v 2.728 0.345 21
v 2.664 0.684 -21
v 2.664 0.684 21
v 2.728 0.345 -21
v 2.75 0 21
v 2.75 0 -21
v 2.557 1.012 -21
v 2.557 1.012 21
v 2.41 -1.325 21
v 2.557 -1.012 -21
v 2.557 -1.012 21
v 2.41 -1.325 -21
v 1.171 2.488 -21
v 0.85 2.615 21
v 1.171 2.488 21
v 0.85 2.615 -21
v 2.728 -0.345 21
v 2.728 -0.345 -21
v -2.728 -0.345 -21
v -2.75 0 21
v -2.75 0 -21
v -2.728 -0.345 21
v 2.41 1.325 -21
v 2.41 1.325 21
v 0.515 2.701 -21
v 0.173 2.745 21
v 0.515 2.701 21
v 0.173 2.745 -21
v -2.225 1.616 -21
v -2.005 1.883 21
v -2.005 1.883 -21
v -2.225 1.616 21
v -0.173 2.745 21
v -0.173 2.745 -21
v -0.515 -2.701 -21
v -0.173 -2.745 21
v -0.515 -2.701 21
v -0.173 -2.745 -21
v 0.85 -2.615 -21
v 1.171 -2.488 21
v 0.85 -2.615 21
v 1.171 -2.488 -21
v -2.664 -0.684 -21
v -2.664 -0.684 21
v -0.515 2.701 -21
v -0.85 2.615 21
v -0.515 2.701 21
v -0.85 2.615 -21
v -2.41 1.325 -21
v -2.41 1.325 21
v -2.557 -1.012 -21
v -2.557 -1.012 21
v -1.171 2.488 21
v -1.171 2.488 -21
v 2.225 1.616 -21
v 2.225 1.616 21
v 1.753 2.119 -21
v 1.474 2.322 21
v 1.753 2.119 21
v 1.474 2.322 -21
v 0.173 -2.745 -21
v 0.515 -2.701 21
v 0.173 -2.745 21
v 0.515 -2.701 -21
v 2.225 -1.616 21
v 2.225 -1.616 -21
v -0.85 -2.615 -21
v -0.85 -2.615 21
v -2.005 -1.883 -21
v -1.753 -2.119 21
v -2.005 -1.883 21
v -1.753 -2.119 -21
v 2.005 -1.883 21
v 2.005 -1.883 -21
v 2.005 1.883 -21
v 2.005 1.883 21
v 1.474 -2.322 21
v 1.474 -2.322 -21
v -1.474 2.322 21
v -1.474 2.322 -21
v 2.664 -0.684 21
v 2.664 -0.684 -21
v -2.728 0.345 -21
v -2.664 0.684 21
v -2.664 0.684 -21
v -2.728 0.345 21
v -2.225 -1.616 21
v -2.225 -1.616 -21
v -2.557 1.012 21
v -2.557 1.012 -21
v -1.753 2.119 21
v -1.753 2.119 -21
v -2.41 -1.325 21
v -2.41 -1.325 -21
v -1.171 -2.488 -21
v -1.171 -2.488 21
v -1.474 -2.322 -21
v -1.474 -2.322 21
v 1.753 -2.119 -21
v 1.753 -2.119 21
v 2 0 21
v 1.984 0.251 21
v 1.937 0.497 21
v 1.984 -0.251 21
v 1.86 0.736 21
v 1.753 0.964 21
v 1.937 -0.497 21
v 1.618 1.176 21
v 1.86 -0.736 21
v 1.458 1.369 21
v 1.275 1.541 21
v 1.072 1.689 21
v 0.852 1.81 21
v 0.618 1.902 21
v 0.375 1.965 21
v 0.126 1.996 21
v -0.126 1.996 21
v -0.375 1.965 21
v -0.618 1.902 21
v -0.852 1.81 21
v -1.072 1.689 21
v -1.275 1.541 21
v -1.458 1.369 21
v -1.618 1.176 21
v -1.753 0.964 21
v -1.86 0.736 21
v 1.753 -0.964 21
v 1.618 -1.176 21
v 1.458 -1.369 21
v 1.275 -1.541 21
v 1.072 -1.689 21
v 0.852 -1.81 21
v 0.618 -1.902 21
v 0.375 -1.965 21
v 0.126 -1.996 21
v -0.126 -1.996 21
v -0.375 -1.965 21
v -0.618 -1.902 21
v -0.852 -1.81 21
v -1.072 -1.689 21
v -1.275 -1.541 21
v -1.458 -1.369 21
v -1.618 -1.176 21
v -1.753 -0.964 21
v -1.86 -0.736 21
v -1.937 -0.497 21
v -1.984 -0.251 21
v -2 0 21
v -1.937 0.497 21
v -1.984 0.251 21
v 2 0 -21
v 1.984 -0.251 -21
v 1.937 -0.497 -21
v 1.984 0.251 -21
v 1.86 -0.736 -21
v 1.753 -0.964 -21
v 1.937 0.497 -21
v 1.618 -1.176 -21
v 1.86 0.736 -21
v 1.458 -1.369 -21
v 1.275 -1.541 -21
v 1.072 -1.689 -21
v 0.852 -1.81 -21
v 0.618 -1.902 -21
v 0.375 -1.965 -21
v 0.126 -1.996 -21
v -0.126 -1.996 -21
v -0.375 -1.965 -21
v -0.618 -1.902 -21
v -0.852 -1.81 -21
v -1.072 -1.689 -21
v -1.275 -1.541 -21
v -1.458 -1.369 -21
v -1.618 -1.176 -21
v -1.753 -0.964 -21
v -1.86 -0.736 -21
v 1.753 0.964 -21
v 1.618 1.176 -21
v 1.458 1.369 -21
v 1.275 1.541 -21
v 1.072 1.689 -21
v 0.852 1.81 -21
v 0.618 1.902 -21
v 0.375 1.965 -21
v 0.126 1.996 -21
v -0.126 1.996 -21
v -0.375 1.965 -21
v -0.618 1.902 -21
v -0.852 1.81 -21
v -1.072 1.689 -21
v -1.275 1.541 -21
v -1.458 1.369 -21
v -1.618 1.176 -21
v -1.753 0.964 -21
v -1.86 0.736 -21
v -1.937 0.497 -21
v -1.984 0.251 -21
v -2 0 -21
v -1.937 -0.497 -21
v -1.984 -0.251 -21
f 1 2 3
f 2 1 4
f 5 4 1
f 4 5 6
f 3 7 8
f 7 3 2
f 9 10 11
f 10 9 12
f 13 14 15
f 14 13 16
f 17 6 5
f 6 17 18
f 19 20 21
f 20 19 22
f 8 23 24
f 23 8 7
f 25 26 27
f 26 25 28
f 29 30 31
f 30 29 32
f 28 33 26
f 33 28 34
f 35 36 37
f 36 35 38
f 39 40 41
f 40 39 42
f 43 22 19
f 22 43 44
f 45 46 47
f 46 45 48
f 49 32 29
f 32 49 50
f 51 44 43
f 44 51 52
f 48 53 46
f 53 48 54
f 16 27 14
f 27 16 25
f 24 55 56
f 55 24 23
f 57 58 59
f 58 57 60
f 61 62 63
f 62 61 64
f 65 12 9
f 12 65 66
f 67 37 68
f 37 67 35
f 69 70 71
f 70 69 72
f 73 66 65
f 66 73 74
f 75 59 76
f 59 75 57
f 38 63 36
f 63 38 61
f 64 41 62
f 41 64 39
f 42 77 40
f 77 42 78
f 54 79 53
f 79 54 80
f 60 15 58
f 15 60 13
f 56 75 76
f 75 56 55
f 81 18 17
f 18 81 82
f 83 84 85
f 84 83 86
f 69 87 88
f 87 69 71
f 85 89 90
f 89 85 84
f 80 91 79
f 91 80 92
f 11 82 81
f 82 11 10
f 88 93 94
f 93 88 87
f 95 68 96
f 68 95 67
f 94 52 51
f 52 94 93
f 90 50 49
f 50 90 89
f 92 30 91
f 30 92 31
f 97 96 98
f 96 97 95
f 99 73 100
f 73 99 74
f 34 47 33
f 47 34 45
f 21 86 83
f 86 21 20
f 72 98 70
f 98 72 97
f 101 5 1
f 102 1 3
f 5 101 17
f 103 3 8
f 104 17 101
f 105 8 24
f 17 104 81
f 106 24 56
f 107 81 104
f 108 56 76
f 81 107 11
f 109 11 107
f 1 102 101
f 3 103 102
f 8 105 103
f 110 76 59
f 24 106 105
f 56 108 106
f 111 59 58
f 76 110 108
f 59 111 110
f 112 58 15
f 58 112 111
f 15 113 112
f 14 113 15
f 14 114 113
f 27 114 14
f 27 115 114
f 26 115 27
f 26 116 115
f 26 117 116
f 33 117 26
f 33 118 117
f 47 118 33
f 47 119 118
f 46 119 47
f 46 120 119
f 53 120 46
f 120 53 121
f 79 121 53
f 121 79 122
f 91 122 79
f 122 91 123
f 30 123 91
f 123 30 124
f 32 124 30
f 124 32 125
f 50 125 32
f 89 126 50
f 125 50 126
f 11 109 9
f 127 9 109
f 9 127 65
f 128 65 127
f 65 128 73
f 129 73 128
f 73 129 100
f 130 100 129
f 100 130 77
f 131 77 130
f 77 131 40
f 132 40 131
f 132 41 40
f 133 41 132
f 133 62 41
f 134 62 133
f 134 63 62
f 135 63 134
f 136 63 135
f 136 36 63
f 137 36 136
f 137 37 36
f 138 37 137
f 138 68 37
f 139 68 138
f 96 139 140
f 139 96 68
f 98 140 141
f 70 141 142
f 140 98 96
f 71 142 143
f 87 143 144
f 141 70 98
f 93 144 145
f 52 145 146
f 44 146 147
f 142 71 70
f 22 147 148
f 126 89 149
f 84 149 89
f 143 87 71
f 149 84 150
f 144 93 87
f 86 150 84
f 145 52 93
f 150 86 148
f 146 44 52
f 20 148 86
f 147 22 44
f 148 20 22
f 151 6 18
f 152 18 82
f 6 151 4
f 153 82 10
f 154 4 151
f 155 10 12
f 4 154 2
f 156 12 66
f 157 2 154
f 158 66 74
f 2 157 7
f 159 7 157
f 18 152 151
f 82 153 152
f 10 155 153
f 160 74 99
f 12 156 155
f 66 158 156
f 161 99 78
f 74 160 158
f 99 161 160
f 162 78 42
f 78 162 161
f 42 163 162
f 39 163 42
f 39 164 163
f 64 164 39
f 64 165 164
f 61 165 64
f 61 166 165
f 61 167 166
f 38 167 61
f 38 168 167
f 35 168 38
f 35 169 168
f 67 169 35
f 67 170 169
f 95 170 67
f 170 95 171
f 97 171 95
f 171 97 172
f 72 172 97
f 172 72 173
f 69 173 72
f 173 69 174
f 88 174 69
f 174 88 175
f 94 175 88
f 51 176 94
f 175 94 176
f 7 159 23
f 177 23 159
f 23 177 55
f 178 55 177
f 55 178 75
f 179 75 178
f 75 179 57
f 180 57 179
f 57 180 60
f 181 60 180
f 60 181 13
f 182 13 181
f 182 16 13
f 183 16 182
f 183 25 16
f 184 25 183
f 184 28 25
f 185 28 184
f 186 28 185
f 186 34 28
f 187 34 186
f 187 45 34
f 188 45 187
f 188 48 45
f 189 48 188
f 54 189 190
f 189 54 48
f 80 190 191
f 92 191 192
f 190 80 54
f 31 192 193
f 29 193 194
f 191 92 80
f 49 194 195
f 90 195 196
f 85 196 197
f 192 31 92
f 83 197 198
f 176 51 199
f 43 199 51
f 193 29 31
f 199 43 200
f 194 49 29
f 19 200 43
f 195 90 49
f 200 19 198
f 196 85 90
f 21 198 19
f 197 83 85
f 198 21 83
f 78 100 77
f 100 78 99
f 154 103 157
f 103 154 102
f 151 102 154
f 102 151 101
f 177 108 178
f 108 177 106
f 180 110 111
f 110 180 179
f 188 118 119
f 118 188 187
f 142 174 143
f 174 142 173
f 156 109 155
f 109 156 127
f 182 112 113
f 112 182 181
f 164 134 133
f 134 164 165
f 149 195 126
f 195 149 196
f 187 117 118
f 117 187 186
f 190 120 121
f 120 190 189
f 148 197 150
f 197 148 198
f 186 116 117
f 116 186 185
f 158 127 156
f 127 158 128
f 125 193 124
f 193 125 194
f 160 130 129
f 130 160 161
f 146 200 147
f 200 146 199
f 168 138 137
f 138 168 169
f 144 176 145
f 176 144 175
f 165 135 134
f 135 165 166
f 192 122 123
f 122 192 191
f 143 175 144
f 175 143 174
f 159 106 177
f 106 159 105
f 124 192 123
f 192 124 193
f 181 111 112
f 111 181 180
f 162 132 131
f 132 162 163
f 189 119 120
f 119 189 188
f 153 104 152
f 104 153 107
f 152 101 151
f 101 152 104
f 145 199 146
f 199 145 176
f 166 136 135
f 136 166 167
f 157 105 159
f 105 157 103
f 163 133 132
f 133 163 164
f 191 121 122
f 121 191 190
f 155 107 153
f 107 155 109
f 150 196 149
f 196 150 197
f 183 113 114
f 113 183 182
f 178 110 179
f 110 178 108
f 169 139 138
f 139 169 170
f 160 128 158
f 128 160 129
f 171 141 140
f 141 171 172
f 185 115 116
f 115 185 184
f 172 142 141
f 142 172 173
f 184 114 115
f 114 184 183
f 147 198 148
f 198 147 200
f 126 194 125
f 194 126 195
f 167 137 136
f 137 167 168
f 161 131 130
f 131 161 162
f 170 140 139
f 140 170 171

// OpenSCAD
$fn = 50;


difference() {
	union() {
		translate(v = [0, 0, -21.0000000000]) {
			cylinder(h = 42, r = 2.7500000000);
		}
	}
	union() {
		translate(v = [0, 0, -100.0000000000]) {
			cylinder(h = 200, r = 2.0000000000);
		}
	}
}
